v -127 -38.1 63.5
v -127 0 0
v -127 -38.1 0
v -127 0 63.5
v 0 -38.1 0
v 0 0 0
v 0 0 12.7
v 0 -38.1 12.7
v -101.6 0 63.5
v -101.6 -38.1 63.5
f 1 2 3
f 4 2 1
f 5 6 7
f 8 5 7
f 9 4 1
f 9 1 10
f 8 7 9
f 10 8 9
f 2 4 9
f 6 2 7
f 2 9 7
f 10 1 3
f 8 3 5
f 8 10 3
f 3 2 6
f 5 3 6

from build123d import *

# Parameters (mm, degrees)
F0_W     = 25.4
F0_H     = 63.5
F1_DEPTH = 38.1


# Not quite as in the source:
# - a feature names something its author has since deleted; it is built from what else it names


with BuildPart() as f1:
    # F0 (on Front) → F1 (new body)
    with BuildSketch(Plane.XZ):
        Polygon((-101.6, 63.5), (-101.6, 0), (-29.9632605165, 0), (0, 0), (0, 12.7), align=None)
        with Locations((-114.3, 31.75)):
            Rectangle(F0_W, F0_H)
    extrude(amount=F1_DEPTH)


solid = f1.part
